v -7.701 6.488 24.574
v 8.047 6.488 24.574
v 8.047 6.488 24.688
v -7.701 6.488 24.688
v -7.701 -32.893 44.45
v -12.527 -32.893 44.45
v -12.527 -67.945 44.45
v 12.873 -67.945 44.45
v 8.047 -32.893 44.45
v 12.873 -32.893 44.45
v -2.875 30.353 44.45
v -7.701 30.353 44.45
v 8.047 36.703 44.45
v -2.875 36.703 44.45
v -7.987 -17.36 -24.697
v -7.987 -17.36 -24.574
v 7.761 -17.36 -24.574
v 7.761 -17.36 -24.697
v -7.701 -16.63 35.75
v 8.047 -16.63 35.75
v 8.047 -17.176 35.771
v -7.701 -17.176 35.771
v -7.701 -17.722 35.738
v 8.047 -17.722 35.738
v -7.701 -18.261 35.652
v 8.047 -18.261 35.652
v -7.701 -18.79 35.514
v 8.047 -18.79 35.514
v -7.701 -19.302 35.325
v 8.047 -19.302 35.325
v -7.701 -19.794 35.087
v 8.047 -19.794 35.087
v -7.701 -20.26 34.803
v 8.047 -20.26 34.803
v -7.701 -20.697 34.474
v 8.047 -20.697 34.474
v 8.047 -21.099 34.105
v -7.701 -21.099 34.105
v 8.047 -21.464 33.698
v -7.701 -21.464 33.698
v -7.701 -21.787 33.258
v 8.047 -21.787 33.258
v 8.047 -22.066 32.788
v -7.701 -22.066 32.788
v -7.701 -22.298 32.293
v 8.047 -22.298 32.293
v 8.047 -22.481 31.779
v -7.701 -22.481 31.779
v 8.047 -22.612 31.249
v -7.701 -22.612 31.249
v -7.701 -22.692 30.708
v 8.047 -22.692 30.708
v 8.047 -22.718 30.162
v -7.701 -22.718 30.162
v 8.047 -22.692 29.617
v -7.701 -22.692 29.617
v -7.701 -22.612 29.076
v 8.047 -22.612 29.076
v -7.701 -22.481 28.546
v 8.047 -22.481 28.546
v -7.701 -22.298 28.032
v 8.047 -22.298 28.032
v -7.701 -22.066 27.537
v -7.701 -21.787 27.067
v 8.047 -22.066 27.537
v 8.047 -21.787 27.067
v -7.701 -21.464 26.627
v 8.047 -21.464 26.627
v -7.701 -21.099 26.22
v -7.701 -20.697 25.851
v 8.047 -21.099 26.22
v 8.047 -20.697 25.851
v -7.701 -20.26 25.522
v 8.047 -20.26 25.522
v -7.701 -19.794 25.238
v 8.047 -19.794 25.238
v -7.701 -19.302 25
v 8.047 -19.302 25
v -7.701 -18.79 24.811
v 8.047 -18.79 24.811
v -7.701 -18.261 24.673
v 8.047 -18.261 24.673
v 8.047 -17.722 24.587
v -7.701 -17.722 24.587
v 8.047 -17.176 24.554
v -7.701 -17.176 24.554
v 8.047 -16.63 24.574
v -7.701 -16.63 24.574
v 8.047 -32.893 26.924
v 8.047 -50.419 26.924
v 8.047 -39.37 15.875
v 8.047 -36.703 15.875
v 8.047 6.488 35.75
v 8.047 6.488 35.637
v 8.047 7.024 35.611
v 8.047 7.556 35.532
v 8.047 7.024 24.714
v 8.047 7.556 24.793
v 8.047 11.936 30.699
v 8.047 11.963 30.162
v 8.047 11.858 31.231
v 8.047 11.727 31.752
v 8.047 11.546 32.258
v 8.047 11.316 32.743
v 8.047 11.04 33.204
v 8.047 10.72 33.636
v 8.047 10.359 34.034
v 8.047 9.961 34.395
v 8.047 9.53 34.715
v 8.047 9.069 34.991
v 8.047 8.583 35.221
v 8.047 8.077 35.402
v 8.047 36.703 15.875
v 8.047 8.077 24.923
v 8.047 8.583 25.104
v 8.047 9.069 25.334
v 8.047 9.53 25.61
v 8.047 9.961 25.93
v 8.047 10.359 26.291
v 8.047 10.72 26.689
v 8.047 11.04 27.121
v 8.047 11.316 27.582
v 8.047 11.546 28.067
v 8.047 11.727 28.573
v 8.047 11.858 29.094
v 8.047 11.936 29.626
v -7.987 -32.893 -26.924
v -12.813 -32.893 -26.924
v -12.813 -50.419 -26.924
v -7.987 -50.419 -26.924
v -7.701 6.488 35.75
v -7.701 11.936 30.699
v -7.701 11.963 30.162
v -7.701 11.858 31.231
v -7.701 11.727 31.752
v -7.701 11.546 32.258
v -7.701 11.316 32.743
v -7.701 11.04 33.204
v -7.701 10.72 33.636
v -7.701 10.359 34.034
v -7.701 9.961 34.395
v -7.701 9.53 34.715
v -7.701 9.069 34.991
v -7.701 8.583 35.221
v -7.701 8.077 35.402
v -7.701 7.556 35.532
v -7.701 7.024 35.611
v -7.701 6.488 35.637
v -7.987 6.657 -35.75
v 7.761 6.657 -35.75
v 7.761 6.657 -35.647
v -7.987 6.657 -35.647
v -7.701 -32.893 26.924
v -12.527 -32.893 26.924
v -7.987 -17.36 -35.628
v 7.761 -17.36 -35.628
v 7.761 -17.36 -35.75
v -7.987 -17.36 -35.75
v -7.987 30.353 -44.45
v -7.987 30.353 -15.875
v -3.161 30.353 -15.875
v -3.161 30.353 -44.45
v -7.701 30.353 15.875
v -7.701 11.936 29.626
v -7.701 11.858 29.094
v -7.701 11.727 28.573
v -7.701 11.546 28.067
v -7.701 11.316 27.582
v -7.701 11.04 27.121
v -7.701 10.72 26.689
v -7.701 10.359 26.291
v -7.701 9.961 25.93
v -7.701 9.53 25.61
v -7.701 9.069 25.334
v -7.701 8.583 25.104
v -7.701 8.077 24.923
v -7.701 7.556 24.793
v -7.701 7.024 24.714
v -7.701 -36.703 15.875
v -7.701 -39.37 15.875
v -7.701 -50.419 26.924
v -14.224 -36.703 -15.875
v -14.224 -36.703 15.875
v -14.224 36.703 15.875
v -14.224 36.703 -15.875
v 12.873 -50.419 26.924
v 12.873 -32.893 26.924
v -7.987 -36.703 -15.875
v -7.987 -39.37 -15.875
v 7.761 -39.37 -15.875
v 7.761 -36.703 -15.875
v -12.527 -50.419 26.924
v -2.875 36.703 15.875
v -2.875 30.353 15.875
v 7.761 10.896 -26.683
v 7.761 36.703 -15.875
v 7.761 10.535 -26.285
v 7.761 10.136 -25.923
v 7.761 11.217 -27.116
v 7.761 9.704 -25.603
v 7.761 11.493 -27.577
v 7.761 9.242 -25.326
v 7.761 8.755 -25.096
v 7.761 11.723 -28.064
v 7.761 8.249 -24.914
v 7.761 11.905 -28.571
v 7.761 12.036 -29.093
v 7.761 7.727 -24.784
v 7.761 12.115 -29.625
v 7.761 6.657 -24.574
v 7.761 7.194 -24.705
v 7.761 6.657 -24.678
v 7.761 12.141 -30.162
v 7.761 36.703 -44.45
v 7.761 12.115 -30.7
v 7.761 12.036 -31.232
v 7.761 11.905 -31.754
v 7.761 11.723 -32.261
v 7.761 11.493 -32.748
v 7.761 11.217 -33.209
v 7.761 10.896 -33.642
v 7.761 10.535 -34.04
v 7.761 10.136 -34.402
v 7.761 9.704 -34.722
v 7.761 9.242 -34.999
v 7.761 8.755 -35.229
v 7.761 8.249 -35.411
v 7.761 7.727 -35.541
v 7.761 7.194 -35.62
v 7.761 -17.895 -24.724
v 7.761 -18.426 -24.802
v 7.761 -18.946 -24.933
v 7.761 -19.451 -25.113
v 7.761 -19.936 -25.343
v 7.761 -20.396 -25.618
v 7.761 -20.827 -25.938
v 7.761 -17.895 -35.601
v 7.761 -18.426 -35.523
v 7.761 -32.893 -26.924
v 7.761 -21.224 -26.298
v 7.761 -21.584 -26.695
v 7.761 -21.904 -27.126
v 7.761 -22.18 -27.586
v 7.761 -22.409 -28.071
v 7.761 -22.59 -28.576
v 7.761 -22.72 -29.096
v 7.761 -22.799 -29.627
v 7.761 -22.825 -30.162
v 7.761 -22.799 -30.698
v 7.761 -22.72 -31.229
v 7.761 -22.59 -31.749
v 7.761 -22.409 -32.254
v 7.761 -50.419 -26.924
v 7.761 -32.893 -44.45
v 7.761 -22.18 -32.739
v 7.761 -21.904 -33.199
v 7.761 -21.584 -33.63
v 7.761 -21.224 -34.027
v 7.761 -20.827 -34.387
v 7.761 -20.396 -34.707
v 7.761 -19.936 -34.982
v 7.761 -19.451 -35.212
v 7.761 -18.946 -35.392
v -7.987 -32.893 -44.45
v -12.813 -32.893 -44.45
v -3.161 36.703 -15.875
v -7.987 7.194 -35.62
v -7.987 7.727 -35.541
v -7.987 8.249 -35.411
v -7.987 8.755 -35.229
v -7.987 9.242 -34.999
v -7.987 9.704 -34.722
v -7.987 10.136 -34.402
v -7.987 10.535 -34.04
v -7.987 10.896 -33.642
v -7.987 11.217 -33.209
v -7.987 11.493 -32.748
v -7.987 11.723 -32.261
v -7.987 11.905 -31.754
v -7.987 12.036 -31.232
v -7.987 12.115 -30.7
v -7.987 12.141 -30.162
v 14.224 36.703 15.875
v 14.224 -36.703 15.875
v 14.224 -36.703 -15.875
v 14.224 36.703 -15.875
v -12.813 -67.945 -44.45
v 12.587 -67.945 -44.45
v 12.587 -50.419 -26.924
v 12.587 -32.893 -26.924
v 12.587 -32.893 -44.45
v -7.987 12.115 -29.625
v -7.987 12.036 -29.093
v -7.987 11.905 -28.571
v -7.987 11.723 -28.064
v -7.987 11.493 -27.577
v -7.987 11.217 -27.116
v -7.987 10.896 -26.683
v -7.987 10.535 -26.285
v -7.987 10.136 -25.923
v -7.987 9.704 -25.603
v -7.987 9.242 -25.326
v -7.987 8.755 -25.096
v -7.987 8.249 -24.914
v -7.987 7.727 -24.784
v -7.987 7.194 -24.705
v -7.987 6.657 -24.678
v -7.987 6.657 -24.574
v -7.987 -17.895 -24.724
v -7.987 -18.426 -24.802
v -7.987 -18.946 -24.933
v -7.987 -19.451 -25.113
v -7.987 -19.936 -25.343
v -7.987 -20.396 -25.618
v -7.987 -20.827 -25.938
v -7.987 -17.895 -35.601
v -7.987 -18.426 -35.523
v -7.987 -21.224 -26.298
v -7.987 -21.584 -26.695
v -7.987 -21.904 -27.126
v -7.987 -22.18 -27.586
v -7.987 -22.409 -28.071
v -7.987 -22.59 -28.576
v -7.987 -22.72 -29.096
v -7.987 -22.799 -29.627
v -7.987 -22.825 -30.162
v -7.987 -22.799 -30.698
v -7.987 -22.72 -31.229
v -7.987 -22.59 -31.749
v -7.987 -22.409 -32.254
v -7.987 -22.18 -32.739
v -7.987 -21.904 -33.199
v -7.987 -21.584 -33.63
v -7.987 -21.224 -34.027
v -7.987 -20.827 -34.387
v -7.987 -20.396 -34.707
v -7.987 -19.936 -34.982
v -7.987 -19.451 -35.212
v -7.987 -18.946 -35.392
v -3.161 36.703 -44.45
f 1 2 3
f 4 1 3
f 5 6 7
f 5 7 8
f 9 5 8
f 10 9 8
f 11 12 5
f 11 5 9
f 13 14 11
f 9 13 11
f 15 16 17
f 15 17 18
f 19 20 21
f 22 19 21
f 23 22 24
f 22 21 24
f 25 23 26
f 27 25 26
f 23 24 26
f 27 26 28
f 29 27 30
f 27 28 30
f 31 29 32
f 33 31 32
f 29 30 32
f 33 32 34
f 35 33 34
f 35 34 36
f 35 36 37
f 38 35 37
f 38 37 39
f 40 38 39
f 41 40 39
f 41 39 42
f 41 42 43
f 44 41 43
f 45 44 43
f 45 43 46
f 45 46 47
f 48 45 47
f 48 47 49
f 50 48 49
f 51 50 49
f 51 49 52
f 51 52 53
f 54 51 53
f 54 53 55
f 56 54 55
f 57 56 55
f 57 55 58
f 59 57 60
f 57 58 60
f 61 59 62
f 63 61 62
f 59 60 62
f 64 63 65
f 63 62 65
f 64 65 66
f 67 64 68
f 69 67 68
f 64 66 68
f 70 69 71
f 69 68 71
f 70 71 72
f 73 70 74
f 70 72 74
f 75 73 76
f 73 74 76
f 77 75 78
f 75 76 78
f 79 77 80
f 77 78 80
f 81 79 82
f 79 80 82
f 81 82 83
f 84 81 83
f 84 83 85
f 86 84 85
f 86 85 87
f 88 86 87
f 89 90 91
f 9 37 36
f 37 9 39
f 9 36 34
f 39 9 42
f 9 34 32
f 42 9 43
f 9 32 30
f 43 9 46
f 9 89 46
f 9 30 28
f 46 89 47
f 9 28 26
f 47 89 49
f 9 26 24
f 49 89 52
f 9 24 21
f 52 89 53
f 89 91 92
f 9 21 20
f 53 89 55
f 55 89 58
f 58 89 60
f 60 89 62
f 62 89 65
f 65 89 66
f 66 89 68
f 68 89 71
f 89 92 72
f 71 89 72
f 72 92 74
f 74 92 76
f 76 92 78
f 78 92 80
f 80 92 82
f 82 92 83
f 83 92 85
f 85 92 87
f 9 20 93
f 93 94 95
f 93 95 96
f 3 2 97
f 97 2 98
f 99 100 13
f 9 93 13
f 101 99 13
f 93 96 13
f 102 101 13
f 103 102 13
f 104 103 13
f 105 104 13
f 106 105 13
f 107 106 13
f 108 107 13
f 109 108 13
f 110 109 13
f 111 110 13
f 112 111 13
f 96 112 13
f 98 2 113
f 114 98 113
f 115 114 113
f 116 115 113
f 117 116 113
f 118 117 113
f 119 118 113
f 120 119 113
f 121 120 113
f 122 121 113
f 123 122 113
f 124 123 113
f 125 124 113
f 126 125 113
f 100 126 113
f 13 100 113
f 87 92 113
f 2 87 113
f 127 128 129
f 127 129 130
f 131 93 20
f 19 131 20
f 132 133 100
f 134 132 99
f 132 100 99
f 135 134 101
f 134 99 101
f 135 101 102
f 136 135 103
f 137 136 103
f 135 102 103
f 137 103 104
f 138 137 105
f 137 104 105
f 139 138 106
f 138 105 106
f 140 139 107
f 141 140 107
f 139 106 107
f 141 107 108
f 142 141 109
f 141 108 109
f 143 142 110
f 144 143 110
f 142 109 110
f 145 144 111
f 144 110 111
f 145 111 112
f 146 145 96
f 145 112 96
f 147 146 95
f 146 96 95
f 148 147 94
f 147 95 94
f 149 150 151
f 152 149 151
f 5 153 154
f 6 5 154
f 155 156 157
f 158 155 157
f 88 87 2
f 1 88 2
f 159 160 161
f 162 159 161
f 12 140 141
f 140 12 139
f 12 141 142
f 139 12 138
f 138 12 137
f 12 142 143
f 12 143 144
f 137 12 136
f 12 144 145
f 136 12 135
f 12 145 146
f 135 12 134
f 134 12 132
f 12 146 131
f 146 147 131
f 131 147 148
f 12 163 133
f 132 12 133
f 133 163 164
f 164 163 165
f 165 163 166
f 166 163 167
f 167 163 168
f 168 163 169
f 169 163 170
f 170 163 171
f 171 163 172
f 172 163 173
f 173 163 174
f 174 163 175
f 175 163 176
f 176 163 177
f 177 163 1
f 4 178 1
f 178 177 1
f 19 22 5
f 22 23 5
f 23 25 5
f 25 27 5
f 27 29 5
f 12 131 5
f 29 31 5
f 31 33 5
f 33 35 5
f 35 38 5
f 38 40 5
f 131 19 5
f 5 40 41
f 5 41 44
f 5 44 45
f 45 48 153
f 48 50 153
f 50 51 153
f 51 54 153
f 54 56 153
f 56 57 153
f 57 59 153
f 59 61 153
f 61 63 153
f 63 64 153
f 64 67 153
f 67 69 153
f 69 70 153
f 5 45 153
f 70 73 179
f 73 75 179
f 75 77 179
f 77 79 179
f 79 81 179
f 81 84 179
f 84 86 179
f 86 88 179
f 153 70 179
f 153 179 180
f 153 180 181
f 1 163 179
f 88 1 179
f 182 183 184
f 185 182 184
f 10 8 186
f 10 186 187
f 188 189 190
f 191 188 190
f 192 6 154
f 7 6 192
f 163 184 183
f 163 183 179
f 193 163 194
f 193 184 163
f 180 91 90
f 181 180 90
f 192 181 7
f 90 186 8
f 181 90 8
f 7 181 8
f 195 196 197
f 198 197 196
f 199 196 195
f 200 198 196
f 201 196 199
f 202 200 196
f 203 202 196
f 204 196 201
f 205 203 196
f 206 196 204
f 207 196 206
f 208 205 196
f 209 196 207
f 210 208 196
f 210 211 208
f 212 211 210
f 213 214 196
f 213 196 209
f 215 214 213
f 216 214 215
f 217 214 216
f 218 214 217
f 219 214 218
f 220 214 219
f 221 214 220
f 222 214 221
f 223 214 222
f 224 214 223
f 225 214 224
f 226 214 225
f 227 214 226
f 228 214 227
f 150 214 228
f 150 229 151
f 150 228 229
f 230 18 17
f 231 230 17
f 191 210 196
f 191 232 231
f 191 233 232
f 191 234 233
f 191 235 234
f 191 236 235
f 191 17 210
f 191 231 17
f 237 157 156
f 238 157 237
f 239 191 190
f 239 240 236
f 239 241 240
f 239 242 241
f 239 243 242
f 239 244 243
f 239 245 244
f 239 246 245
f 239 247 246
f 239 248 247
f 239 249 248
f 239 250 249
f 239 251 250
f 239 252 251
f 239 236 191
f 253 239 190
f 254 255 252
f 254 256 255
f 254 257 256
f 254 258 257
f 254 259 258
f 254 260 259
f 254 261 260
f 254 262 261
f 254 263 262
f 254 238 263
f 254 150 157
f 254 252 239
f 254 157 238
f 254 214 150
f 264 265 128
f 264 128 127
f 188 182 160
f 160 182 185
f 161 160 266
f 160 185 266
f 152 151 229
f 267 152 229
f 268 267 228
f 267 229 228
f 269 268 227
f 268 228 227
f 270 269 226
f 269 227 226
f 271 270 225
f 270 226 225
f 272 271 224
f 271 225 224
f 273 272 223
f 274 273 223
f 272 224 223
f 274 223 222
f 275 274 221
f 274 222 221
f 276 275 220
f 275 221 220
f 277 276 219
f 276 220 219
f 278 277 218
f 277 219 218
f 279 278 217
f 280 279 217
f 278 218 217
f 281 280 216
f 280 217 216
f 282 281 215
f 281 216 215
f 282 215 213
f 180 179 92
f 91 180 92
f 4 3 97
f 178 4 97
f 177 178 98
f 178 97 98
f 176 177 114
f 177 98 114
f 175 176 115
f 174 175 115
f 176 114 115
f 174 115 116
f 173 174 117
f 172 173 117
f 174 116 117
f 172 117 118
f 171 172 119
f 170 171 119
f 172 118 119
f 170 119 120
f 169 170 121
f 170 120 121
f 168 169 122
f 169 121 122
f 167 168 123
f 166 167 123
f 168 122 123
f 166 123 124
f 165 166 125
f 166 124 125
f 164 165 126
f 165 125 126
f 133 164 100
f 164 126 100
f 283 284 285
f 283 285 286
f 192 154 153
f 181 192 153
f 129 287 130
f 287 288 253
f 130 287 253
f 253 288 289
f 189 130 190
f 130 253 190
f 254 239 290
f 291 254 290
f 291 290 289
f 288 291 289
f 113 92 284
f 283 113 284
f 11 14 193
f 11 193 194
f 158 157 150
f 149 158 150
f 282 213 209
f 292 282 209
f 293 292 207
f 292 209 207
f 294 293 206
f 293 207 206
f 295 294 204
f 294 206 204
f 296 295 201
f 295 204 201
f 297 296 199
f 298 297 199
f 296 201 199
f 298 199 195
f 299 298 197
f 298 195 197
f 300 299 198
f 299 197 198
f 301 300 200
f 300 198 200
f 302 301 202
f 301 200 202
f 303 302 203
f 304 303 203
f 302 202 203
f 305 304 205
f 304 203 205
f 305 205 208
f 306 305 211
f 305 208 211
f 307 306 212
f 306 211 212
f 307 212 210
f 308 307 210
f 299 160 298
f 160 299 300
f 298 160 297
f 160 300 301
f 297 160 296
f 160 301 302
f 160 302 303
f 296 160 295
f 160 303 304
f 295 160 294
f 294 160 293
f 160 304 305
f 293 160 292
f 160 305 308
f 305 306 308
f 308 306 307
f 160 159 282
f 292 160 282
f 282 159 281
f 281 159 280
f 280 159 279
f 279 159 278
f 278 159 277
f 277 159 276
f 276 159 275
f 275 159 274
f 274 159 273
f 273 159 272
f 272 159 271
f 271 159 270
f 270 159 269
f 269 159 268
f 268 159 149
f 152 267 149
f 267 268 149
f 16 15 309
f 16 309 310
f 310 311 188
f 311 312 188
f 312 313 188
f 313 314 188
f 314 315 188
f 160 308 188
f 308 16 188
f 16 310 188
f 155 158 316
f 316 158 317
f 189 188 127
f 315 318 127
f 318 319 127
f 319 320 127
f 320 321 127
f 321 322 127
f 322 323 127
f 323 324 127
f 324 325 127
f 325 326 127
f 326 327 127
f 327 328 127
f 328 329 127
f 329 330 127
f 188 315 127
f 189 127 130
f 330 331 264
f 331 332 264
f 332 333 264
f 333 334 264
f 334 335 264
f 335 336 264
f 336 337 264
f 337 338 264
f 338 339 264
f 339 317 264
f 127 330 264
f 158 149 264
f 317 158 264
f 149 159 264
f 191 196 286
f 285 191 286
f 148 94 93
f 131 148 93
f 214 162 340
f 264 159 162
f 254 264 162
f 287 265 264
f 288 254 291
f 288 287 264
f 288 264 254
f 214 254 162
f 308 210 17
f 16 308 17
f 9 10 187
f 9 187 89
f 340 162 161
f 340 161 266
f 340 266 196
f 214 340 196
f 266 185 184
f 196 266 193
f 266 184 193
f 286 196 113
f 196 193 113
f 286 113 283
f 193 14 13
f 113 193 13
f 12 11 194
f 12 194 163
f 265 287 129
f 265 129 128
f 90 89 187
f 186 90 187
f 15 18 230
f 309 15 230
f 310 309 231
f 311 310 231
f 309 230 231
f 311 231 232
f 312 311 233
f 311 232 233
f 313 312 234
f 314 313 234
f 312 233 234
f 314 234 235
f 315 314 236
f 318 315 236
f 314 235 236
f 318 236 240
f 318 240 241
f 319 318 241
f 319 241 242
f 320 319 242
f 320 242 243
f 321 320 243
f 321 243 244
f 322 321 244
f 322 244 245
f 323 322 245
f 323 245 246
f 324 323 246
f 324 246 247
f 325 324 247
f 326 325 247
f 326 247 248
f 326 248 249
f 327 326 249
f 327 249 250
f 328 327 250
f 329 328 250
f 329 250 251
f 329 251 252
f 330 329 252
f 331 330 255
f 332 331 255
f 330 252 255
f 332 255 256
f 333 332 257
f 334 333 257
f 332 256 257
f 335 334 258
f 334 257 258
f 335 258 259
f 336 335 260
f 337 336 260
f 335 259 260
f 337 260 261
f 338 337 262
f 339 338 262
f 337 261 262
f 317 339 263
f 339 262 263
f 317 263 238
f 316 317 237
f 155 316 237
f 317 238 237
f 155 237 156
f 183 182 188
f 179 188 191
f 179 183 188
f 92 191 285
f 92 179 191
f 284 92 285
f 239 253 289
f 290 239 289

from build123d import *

# Parameters (mm, degrees)
F0_W      = 28.448
F0_H      = 73.406
F1_DEPTH  = 15.875
F4_DEPTH  = 28.575
F5_DEPTH  = 28.575
F7_DEPTH  = 17.526
F9_DEPTH  = 17.526
F10_W     = 15.748
F10_H     = 35.052
F11_DEPTH = 28.575
F12_W     = 15.748
F12_H     = 35.052
F13_DEPTH = 28.575
F15_DEPTH = 27.0975020094
F17_DEPTH = 25.4
F19_DEPTH = 25.4
F21_DEPTH = 25.4


with BuildPart() as f1:
    # F0 (on Top) → F1 (new body, symmetric)
    with BuildSketch(Plane.XY):
        Rectangle(F0_W, F0_H)
    extrude(amount=F1_DEPTH, both=True)

    # F2 (on face) → F4 (join)
    with BuildSketch(Plane.XY.offset(15.875)):
        Polygon((8.0465020094, 36.703), (-2.8754979906, 36.703), (-2.8754979906, 30.353), (-7.7014979906, 30.353), (-7.7014979906, -32.893), (8.0465020094, -32.893), align=None)
    extrude(amount=F4_DEPTH)

    # F3 (on face) → F5 (join)
    with BuildSketch(Plane(origin=(0, 0, -15.875), x_dir=(1, 0, 0), z_dir=(0, 0, -1))):
        Polygon((-3.1607374152, -30.353), (-3.1607374152, -36.703), (7.7612625848, -36.703), (7.7612625848, 32.893), (-7.9867374152, 32.893), (-7.9867374152, -30.353), align=None)
    extrude(amount=F5_DEPTH)

    # F6 (on face) → F7 (join)
    with BuildSketch(Plane.XY.offset(44.45)):
        Polygon((-7.7014979906, -32.893), (-12.5274979906, -32.893), (-12.5274979906, -67.945), (12.8725020094, -67.945), (12.8725020094, -32.893), (8.0465020094, -32.893), align=None)
    extrude(amount=-F7_DEPTH)

    # F8 (on face) → F9 (join)
    with BuildSketch(Plane(origin=(0, 0, -44.45), x_dir=(1, 0, 0), z_dir=(0, 0, -1))):
        Polygon((-12.8127374152, 67.945), (-12.8127374152, 32.893), (-7.9867374152, 32.893), (7.7612625848, 32.893), (12.5872625848, 32.893), (12.5872625848, 67.945), align=None)
    extrude(amount=-F9_DEPTH)

    # F10 (on face) → F11 (join)
    with BuildSketch(Plane.XY.offset(44.45)):
        with Locations((0.1725020094, -50.419)):
            Rectangle(F10_W, F10_H)
    extrude(amount=-F11_DEPTH)

    # F12 (on face) → F13 (join)
    with BuildSketch(Plane(origin=(0, 0, -44.45), x_dir=(1, 0, 0), z_dir=(0, 0, -1))):
        with Locations((-0.1127374152, 50.419)):
            Rectangle(F12_W, F12_H)
    extrude(amount=-F13_DEPTH)

    # F14 (on face) → F15 (cut, through all)
    with BuildSketch(Plane.YZ.offset(12.8725020094)):
        Polygon((-50.419, 26.924), (-67.945, 26.924), (-67.945, 15.875), (-39.37, 15.875), align=None)
        Polygon((-50.419, 26.924), (-67.945, 44.45), (-67.945, 26.924), align=None)
    extrude(amount=-F15_DEPTH, mode=Mode.SUBTRACT)

    # F16 (on face) → F17 (cut)
    with BuildSketch(Plane.YZ.offset(12.5872625848)):
        Polygon((-67.945, -15.875), (-67.945, -26.924), (-50.419, -26.924), (-39.37, -15.875), align=None)
        Polygon((-67.945, -26.924), (-67.945, -44.45), (-50.419, -26.924), align=None)
    extrude(amount=-F17_DEPTH, mode=Mode.SUBTRACT)

    # F18 (on face) → F19 (cut)
    with BuildSketch(Plane.YZ.offset(8.0465020094)):
        with BuildLine():
            Line((-16.6304964619, 24.5745), (-17.1099361032, 24.5745))
            Line((-17.1099361032, 24.5745), (-17.1099361032, 35.7505))
            Line((-17.1099361032, 35.7505), (-16.6304964619, 35.7505))
            ThreePointArc((-16.6304964619, 35.7505), (-22.7184658901, 30.1625), (-16.6304964619, 24.5745))
        make_face()
        with BuildLine():
            Line((-17.1099361032, 35.7505), (-17.1099361032, 24.5745))
            Line((-17.1099361032, 24.5745), (-16.6304964619, 24.5745))
            ThreePointArc((-16.6304964619, 24.5745), (-12.9780746656, 26.369964248), (-11.5014063164, 30.1625))
            ThreePointArc((-11.5014063164, 30.1625), (-12.9780746656, 33.955035752), (-16.6304964619, 35.7505))
            Line((-16.6304964619, 35.7505), (-17.1099361032, 35.7505))
        make_face()
        with BuildLine():
            ThreePointArc((-11.5014063164, 30.1625), (-12.9780746656, 26.369964248), (-16.6304964619, 24.5745))
            Line((-16.6304964619, 24.5745), (6.4878210612, 24.5745))
            Line((6.4878210612, 24.5745), (6.4878210612, 24.687532988))
            ThreePointArc((6.4878210612, 24.687532988), (1.0128540493, 30.1625), (6.4878210612, 35.637467012))
            Line((6.4878210612, 35.637467012), (6.4878210612, 35.7505))
            Line((6.4878210612, 35.7505), (-16.6304964619, 35.7505))
            ThreePointArc((-16.6304964619, 35.7505), (-12.9780746656, 33.955035752), (-11.5014063164, 30.1625))
        make_face()
        with BuildLine():
            ThreePointArc((6.4878210612, 35.637467012), (1.0128540493, 30.1625), (6.4878210612, 24.687532988))
            Line((6.4878210612, 24.687532988), (6.4878210612, 35.637467012))
        make_face()
        with BuildLine():
            Line((6.4878210612, 35.637467012), (6.4878210612, 24.687532988))
            ThreePointArc((6.4878210612, 24.687532988), (10.3592073622, 26.2911136991), (11.9627880732, 30.1625))
            ThreePointArc((11.9627880732, 30.1625), (10.3592073622, 34.0338863009), (6.4878210612, 35.637467012))
        make_face()
    extrude(amount=-F19_DEPTH, mode=Mode.SUBTRACT)

    # F20 (on face) → F21 (cut)
    with BuildSketch(Plane.YZ.offset(7.7612625848)):
        with BuildLine():
            ThreePointArc((-17.3597068011, -24.6973145474), (-22.8248922537, -30.1625), (-17.3597068011, -35.6276854526))
            Line((-17.3597068011, -35.6276854526), (-17.3597068011, -24.6973145474))
        make_face()
        with BuildLine():
            Line((-17.3597068011, -24.6973145474), (-17.3597068011, -35.6276854526))
            ThreePointArc((-17.3597068011, -35.6276854526), (-13.4952371071, -34.026969694), (-11.8945213485, -30.1625))
            ThreePointArc((-11.8945213485, -30.1625), (-13.4952371071, -26.298030306), (-17.3597068011, -24.6973145474))
        make_face()
        with BuildLine():
            Line((-17.3597068011, -35.7505), (6.6567515023, -35.7505))
            Line((6.6567515023, -35.7505), (6.6567515023, -35.6466932751))
            ThreePointArc((6.6567515023, -35.6466932751), (1.1725582272, -30.1625), (6.6567515023, -24.6783067249))
            Line((6.6567515023, -24.6783067249), (6.6567515023, -24.5745))
            Line((6.6567515023, -24.5745), (-17.3597068011, -24.5745))
            Line((-17.3597068011, -24.5745), (-17.3597068011, -24.6973145474))
            ThreePointArc((-17.3597068011, -24.6973145474), (-13.4952371071, -26.298030306), (-11.8945213485, -30.1625))
            ThreePointArc((-11.8945213485, -30.1625), (-13.4952371071, -34.026969694), (-17.3597068011, -35.6276854526))
            Line((-17.3597068011, -35.6276854526), (-17.3597068011, -35.7505))
        make_face()
        with BuildLine():
            ThreePointArc((6.6567515023, -24.6783067249), (1.1725582272, -30.1625), (6.6567515023, -35.6466932751))
            Line((6.6567515023, -35.6466932751), (6.6567515023, -24.6783067249))
        make_face()
        with BuildLine():
            Line((6.6567515023, -24.6783067249), (6.6567515023, -35.6466932751))
            ThreePointArc((6.6567515023, -35.6466932751), (10.5346617564, -34.0404102541), (12.1409447774, -30.1625))
            ThreePointArc((12.1409447774, -30.1625), (10.5346617564, -26.2845897459), (6.6567515023, -24.6783067249))
        make_face()
    extrude(amount=-F21_DEPTH, mode=Mode.SUBTRACT)


solid = f1.part
